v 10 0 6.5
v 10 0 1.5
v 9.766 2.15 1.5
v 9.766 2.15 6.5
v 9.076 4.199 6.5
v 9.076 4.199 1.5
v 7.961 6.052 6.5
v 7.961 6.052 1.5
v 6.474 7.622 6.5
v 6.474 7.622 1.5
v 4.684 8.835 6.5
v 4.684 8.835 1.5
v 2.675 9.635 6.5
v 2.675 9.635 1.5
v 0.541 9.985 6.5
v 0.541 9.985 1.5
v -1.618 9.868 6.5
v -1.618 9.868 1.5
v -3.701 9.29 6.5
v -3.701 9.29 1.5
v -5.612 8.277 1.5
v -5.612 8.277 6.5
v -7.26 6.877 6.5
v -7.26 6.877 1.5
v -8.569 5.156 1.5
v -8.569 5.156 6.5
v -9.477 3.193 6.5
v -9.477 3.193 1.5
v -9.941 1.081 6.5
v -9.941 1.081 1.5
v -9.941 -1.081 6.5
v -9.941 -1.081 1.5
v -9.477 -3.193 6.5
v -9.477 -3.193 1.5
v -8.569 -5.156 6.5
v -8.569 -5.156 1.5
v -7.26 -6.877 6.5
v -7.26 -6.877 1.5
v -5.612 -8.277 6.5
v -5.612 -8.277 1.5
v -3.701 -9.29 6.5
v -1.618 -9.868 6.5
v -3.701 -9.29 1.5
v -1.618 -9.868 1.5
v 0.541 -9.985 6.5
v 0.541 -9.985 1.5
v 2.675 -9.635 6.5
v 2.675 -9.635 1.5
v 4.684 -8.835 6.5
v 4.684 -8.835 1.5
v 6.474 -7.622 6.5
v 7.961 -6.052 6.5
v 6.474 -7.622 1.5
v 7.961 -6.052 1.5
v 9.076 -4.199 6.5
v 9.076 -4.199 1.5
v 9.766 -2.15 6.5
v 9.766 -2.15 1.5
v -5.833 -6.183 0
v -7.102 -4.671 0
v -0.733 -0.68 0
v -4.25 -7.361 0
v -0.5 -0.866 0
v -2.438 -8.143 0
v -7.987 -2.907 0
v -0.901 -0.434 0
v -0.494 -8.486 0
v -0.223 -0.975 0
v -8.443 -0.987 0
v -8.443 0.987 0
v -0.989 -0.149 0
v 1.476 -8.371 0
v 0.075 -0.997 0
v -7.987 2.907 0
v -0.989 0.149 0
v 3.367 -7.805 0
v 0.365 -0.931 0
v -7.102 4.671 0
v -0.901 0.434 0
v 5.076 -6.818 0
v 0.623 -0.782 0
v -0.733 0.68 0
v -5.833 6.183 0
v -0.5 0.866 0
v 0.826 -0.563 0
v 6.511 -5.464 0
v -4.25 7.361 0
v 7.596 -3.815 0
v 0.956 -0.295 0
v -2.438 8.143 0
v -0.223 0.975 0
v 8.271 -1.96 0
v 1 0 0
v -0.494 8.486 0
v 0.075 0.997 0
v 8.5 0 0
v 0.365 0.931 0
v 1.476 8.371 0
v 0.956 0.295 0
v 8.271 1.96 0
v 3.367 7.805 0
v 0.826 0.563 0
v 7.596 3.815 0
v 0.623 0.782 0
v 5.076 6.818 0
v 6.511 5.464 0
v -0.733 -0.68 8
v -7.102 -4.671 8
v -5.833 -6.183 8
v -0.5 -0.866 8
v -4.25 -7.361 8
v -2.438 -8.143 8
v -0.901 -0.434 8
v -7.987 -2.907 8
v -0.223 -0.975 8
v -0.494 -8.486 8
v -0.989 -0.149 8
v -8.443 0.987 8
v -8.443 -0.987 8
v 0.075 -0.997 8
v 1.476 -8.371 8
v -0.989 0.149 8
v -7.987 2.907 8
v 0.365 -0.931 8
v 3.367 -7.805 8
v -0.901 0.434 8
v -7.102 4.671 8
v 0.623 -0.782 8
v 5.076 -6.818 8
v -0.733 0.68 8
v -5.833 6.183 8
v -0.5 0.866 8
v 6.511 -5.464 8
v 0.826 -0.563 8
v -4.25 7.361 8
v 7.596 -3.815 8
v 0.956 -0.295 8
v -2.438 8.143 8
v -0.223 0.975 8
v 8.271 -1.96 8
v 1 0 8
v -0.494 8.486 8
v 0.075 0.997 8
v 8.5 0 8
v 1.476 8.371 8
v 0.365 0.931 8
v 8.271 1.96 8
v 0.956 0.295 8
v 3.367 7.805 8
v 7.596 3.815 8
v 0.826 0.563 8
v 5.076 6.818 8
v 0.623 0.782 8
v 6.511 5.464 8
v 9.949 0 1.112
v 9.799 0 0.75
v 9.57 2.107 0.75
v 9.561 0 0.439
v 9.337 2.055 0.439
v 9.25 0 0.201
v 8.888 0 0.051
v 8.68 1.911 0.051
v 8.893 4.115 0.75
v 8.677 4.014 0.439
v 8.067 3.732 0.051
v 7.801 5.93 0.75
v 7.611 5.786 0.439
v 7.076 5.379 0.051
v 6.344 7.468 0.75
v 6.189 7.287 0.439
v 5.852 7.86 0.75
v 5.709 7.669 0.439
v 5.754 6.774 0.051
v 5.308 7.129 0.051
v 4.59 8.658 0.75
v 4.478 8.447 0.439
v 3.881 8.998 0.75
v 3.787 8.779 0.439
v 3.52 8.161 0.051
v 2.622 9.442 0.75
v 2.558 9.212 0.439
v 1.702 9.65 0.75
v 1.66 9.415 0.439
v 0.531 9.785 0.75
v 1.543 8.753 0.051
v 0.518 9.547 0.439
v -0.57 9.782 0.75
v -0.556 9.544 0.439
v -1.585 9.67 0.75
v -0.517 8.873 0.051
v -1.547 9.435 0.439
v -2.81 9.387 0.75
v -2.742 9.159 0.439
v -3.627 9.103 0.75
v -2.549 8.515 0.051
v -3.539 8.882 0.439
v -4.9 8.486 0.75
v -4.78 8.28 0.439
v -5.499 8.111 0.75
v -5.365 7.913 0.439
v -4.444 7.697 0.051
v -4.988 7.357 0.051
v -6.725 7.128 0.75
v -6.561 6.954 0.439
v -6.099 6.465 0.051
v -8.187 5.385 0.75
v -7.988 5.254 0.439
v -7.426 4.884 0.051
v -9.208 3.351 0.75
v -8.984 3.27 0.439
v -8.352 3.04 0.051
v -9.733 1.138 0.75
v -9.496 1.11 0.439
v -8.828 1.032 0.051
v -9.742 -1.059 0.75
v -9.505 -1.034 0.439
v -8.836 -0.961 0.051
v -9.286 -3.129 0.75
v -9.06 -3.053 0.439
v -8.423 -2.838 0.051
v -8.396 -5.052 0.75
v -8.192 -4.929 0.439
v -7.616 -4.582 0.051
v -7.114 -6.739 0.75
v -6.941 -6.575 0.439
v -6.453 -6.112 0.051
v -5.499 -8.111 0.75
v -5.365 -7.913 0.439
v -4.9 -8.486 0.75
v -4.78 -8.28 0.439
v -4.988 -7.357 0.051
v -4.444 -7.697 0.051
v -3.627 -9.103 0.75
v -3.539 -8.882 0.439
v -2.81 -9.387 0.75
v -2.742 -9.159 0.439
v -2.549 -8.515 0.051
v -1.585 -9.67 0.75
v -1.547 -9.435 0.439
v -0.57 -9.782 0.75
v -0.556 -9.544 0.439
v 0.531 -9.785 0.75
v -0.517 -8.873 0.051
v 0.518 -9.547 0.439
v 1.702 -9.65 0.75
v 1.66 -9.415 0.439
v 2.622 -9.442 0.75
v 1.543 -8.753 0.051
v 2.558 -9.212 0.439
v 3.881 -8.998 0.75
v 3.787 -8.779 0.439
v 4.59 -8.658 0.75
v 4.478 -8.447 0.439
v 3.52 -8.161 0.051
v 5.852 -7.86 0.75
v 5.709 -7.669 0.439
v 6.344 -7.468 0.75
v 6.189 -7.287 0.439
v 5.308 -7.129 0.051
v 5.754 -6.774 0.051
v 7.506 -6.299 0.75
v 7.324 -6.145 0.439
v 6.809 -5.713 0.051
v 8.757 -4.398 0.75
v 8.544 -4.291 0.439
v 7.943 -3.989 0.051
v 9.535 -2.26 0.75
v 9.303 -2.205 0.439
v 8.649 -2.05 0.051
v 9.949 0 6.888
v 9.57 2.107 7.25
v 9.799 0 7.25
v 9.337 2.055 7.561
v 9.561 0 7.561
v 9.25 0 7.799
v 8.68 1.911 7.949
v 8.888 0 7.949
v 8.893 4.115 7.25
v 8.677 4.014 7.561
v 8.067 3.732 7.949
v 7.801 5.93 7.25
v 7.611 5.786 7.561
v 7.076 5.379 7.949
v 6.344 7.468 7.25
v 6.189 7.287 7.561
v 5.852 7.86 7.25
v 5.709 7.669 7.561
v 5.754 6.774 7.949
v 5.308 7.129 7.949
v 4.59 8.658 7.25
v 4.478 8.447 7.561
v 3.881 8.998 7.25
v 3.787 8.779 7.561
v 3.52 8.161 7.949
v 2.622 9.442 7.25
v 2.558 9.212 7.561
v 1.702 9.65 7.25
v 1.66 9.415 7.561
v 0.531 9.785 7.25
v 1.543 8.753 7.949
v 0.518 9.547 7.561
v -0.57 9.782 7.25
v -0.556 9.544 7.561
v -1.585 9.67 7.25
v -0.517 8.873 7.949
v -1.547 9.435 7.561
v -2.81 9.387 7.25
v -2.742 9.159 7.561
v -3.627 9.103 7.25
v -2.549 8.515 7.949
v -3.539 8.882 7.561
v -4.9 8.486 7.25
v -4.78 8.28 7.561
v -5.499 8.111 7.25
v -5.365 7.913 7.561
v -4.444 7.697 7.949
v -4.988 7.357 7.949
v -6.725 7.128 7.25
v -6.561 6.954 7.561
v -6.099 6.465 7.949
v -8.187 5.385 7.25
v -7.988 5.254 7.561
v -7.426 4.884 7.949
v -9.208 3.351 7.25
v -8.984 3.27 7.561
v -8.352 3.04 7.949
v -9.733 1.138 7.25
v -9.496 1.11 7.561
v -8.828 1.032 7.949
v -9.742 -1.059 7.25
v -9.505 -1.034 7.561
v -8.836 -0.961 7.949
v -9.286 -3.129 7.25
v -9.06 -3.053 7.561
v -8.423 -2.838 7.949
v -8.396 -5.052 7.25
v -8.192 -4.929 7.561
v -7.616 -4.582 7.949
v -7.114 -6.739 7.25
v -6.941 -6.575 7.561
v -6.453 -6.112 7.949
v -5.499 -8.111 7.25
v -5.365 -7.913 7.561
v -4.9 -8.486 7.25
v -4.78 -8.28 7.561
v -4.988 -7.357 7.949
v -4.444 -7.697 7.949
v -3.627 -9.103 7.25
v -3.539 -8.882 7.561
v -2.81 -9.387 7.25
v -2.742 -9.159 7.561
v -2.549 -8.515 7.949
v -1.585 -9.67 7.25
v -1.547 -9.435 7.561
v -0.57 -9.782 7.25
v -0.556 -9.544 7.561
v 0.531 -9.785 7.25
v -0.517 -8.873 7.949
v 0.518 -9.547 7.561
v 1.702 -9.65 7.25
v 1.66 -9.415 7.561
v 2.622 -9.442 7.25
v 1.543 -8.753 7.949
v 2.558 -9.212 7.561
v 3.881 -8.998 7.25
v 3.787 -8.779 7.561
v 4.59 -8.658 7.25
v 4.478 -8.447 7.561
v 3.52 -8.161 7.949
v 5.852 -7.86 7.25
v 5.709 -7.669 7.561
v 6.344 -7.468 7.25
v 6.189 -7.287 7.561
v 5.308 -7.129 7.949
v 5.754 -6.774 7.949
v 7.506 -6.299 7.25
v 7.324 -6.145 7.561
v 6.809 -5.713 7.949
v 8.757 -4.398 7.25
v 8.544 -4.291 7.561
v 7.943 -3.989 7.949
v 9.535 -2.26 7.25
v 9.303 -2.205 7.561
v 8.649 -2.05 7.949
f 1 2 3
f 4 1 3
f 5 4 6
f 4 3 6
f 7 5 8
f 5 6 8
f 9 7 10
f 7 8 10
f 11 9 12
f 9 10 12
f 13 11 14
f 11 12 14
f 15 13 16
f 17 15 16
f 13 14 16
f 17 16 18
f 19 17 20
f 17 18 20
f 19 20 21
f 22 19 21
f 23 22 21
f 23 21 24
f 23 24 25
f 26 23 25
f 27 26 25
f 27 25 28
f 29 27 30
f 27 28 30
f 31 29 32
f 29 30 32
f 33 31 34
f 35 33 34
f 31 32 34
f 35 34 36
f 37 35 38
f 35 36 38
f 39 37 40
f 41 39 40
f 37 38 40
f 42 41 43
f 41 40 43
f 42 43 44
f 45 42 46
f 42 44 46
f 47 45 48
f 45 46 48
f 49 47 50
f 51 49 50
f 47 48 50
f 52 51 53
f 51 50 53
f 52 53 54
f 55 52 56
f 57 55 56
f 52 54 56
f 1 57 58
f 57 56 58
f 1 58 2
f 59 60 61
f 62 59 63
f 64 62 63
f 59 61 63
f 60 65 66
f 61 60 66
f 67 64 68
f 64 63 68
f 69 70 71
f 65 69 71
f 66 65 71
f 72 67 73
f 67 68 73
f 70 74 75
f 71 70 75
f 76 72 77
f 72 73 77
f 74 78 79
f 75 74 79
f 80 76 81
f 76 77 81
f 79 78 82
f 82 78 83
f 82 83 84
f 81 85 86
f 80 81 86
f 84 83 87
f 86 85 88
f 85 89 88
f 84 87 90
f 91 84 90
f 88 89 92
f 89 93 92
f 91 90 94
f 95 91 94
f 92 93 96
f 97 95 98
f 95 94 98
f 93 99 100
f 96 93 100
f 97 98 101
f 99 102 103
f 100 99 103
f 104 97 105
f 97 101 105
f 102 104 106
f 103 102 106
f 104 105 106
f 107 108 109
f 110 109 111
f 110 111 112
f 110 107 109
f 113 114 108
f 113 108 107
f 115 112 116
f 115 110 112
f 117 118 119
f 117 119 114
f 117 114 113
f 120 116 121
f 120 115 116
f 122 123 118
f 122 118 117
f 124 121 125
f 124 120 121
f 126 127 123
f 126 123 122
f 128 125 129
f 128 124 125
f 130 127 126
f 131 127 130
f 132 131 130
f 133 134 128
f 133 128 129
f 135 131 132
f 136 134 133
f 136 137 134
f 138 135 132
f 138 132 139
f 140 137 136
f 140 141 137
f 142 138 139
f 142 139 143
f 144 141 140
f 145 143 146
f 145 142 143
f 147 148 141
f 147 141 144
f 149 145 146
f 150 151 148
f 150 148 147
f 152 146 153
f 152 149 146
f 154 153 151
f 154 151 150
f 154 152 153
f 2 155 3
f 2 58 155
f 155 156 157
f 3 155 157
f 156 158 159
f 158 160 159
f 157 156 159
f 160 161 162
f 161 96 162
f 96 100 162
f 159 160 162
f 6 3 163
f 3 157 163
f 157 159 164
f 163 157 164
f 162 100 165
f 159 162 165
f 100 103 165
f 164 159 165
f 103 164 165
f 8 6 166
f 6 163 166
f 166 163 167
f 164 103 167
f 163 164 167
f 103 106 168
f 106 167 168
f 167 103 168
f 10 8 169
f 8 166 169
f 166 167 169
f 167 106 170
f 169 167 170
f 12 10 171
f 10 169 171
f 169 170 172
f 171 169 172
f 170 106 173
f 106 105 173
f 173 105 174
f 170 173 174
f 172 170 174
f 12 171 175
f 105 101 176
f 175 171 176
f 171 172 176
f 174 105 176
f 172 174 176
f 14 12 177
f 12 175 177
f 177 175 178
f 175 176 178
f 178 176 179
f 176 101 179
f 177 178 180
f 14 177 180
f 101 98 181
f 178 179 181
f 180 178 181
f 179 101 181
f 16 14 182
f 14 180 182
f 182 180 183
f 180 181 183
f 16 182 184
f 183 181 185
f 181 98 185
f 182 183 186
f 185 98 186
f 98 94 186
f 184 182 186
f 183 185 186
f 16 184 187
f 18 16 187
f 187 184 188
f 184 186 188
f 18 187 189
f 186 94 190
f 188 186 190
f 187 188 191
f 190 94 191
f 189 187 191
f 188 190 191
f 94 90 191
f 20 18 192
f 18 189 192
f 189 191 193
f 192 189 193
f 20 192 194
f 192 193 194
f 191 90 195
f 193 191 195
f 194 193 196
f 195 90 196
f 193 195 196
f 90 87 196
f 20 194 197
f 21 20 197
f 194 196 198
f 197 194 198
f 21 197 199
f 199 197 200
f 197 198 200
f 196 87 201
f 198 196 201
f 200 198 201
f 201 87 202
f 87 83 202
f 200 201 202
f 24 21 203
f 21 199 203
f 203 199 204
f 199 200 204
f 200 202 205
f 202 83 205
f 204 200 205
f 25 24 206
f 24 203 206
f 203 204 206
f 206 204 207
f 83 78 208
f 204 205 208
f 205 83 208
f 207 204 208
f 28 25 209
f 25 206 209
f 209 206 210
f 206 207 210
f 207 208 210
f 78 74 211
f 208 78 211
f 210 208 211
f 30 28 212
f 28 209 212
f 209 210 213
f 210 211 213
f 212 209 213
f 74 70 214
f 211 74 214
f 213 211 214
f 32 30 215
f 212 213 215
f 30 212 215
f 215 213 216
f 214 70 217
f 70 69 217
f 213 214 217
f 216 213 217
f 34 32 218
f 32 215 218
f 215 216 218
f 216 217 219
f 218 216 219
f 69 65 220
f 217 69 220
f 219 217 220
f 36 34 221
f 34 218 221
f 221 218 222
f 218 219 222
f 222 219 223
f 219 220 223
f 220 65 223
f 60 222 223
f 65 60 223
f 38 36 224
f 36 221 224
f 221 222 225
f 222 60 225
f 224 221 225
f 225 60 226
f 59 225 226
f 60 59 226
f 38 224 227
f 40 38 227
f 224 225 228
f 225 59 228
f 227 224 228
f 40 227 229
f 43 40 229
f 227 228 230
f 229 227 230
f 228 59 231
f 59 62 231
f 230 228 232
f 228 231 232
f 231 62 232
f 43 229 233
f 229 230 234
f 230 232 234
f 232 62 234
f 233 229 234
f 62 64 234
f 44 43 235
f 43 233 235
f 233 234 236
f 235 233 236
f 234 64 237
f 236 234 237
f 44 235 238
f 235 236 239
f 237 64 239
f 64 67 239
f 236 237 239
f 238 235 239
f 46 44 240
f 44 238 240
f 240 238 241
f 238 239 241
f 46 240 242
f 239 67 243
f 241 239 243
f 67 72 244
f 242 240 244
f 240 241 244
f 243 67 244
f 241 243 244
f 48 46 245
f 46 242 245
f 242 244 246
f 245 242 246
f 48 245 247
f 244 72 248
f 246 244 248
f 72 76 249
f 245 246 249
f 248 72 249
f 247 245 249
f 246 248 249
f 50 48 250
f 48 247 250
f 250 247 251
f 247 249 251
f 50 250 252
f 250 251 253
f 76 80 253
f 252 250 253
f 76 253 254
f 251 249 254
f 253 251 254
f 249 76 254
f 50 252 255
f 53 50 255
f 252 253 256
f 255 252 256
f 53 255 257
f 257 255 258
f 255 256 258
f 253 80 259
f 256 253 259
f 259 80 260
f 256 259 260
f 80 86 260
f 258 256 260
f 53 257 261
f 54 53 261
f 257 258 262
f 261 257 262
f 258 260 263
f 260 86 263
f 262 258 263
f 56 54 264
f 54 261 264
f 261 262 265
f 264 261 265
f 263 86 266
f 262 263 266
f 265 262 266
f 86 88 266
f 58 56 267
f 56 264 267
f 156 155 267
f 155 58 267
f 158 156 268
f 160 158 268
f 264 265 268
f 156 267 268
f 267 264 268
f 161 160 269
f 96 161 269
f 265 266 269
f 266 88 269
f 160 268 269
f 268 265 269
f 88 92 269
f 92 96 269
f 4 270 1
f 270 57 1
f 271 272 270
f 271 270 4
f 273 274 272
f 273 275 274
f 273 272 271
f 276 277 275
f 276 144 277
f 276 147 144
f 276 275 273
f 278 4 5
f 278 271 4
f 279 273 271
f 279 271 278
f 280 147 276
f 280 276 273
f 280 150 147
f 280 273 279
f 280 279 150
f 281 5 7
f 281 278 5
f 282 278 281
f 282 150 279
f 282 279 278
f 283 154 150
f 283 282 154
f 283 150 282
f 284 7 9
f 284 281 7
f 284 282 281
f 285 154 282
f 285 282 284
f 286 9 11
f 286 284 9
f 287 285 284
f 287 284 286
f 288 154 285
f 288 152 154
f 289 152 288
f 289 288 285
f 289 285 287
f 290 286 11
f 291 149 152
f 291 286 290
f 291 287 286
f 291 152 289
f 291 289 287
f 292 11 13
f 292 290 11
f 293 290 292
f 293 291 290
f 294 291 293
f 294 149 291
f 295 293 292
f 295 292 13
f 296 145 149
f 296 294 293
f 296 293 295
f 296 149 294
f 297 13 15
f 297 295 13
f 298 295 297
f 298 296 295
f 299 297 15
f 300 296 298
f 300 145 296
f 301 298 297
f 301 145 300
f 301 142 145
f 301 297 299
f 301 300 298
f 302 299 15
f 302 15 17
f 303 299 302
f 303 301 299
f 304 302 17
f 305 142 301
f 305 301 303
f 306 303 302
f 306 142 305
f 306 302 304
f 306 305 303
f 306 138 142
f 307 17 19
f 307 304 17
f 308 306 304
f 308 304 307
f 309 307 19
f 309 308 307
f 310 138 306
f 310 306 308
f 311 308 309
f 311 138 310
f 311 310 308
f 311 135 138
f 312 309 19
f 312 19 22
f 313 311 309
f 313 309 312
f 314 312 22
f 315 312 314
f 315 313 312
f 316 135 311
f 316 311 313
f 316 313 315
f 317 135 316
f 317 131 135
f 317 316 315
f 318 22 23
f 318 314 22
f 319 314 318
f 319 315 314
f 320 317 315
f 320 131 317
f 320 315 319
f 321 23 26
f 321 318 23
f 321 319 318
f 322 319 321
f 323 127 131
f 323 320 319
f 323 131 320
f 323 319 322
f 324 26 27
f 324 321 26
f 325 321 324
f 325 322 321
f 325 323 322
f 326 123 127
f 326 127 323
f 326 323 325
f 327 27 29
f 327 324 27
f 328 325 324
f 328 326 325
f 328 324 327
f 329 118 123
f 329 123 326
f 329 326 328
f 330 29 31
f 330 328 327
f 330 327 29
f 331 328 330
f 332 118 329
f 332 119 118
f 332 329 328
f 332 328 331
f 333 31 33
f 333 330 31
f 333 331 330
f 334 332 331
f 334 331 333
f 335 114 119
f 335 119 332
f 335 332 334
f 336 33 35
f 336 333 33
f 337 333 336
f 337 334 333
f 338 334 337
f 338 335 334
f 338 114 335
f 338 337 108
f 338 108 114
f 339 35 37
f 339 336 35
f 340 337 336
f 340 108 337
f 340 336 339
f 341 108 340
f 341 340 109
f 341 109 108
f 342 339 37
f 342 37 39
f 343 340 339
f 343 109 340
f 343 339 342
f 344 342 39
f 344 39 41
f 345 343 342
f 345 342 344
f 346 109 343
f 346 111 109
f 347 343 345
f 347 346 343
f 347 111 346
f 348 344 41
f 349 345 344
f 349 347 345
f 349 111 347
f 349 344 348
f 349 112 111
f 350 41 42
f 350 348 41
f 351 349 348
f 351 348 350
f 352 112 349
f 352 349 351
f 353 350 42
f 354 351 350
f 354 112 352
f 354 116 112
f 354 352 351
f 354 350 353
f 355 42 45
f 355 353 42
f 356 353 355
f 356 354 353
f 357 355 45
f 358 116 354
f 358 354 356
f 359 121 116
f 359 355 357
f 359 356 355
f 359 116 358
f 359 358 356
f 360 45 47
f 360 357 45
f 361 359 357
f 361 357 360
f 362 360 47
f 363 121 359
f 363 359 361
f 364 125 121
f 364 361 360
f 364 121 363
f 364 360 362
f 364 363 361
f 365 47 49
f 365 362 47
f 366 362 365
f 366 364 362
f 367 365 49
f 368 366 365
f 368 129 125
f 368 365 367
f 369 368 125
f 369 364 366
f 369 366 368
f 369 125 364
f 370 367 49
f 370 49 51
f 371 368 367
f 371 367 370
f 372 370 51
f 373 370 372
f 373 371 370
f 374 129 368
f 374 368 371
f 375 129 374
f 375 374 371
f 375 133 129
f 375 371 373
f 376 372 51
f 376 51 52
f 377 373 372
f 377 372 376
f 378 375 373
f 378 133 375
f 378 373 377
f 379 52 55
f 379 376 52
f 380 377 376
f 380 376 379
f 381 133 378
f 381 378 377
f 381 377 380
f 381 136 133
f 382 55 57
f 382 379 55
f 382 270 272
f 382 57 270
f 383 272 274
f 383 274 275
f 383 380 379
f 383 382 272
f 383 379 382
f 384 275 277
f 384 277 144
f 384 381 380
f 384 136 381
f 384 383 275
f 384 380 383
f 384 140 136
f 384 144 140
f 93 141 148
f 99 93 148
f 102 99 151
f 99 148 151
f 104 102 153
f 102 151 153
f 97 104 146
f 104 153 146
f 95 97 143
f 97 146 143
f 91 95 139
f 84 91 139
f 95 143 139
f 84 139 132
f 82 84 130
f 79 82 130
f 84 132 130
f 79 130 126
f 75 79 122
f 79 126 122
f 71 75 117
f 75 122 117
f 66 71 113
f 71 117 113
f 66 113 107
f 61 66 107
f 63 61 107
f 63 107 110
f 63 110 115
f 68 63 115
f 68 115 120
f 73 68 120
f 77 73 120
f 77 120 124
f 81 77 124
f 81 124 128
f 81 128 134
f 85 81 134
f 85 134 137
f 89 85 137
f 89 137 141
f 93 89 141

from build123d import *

# Parameters (mm, degrees)
CROQUIS1_R              = 10
SALIENTE_EXTRUIR1_DEPTH = 8
REDONDEO1_R             = 1.5
CROQUIS3_R              = 1
CORTAR_EXTRUIR1_DEPTH   = 9


with BuildPart() as part:
    # Croquis1 → Saliente-Extruir1 (new body)
    with BuildSketch(Plane.XY):
        Circle(CROQUIS1_R)
    extrude(amount=SALIENTE_EXTRUIR1_DEPTH)

    # Redondeo1
    redondeo1_edges = [part.edges().sort_by_distance(p)[0] for p in [
        (-10, 0, 0),
        (-10, 0, 8),
    ]]
    fillet(redondeo1_edges, radius=REDONDEO1_R)

    # Croquis3 → Cortar-Extruir1 (cut, through all)
    with BuildSketch(Plane.XY.offset(8)):
        Circle(CROQUIS3_R)
    extrude(amount=-CORTAR_EXTRUIR1_DEPTH, mode=Mode.SUBTRACT)


solid = part.part
